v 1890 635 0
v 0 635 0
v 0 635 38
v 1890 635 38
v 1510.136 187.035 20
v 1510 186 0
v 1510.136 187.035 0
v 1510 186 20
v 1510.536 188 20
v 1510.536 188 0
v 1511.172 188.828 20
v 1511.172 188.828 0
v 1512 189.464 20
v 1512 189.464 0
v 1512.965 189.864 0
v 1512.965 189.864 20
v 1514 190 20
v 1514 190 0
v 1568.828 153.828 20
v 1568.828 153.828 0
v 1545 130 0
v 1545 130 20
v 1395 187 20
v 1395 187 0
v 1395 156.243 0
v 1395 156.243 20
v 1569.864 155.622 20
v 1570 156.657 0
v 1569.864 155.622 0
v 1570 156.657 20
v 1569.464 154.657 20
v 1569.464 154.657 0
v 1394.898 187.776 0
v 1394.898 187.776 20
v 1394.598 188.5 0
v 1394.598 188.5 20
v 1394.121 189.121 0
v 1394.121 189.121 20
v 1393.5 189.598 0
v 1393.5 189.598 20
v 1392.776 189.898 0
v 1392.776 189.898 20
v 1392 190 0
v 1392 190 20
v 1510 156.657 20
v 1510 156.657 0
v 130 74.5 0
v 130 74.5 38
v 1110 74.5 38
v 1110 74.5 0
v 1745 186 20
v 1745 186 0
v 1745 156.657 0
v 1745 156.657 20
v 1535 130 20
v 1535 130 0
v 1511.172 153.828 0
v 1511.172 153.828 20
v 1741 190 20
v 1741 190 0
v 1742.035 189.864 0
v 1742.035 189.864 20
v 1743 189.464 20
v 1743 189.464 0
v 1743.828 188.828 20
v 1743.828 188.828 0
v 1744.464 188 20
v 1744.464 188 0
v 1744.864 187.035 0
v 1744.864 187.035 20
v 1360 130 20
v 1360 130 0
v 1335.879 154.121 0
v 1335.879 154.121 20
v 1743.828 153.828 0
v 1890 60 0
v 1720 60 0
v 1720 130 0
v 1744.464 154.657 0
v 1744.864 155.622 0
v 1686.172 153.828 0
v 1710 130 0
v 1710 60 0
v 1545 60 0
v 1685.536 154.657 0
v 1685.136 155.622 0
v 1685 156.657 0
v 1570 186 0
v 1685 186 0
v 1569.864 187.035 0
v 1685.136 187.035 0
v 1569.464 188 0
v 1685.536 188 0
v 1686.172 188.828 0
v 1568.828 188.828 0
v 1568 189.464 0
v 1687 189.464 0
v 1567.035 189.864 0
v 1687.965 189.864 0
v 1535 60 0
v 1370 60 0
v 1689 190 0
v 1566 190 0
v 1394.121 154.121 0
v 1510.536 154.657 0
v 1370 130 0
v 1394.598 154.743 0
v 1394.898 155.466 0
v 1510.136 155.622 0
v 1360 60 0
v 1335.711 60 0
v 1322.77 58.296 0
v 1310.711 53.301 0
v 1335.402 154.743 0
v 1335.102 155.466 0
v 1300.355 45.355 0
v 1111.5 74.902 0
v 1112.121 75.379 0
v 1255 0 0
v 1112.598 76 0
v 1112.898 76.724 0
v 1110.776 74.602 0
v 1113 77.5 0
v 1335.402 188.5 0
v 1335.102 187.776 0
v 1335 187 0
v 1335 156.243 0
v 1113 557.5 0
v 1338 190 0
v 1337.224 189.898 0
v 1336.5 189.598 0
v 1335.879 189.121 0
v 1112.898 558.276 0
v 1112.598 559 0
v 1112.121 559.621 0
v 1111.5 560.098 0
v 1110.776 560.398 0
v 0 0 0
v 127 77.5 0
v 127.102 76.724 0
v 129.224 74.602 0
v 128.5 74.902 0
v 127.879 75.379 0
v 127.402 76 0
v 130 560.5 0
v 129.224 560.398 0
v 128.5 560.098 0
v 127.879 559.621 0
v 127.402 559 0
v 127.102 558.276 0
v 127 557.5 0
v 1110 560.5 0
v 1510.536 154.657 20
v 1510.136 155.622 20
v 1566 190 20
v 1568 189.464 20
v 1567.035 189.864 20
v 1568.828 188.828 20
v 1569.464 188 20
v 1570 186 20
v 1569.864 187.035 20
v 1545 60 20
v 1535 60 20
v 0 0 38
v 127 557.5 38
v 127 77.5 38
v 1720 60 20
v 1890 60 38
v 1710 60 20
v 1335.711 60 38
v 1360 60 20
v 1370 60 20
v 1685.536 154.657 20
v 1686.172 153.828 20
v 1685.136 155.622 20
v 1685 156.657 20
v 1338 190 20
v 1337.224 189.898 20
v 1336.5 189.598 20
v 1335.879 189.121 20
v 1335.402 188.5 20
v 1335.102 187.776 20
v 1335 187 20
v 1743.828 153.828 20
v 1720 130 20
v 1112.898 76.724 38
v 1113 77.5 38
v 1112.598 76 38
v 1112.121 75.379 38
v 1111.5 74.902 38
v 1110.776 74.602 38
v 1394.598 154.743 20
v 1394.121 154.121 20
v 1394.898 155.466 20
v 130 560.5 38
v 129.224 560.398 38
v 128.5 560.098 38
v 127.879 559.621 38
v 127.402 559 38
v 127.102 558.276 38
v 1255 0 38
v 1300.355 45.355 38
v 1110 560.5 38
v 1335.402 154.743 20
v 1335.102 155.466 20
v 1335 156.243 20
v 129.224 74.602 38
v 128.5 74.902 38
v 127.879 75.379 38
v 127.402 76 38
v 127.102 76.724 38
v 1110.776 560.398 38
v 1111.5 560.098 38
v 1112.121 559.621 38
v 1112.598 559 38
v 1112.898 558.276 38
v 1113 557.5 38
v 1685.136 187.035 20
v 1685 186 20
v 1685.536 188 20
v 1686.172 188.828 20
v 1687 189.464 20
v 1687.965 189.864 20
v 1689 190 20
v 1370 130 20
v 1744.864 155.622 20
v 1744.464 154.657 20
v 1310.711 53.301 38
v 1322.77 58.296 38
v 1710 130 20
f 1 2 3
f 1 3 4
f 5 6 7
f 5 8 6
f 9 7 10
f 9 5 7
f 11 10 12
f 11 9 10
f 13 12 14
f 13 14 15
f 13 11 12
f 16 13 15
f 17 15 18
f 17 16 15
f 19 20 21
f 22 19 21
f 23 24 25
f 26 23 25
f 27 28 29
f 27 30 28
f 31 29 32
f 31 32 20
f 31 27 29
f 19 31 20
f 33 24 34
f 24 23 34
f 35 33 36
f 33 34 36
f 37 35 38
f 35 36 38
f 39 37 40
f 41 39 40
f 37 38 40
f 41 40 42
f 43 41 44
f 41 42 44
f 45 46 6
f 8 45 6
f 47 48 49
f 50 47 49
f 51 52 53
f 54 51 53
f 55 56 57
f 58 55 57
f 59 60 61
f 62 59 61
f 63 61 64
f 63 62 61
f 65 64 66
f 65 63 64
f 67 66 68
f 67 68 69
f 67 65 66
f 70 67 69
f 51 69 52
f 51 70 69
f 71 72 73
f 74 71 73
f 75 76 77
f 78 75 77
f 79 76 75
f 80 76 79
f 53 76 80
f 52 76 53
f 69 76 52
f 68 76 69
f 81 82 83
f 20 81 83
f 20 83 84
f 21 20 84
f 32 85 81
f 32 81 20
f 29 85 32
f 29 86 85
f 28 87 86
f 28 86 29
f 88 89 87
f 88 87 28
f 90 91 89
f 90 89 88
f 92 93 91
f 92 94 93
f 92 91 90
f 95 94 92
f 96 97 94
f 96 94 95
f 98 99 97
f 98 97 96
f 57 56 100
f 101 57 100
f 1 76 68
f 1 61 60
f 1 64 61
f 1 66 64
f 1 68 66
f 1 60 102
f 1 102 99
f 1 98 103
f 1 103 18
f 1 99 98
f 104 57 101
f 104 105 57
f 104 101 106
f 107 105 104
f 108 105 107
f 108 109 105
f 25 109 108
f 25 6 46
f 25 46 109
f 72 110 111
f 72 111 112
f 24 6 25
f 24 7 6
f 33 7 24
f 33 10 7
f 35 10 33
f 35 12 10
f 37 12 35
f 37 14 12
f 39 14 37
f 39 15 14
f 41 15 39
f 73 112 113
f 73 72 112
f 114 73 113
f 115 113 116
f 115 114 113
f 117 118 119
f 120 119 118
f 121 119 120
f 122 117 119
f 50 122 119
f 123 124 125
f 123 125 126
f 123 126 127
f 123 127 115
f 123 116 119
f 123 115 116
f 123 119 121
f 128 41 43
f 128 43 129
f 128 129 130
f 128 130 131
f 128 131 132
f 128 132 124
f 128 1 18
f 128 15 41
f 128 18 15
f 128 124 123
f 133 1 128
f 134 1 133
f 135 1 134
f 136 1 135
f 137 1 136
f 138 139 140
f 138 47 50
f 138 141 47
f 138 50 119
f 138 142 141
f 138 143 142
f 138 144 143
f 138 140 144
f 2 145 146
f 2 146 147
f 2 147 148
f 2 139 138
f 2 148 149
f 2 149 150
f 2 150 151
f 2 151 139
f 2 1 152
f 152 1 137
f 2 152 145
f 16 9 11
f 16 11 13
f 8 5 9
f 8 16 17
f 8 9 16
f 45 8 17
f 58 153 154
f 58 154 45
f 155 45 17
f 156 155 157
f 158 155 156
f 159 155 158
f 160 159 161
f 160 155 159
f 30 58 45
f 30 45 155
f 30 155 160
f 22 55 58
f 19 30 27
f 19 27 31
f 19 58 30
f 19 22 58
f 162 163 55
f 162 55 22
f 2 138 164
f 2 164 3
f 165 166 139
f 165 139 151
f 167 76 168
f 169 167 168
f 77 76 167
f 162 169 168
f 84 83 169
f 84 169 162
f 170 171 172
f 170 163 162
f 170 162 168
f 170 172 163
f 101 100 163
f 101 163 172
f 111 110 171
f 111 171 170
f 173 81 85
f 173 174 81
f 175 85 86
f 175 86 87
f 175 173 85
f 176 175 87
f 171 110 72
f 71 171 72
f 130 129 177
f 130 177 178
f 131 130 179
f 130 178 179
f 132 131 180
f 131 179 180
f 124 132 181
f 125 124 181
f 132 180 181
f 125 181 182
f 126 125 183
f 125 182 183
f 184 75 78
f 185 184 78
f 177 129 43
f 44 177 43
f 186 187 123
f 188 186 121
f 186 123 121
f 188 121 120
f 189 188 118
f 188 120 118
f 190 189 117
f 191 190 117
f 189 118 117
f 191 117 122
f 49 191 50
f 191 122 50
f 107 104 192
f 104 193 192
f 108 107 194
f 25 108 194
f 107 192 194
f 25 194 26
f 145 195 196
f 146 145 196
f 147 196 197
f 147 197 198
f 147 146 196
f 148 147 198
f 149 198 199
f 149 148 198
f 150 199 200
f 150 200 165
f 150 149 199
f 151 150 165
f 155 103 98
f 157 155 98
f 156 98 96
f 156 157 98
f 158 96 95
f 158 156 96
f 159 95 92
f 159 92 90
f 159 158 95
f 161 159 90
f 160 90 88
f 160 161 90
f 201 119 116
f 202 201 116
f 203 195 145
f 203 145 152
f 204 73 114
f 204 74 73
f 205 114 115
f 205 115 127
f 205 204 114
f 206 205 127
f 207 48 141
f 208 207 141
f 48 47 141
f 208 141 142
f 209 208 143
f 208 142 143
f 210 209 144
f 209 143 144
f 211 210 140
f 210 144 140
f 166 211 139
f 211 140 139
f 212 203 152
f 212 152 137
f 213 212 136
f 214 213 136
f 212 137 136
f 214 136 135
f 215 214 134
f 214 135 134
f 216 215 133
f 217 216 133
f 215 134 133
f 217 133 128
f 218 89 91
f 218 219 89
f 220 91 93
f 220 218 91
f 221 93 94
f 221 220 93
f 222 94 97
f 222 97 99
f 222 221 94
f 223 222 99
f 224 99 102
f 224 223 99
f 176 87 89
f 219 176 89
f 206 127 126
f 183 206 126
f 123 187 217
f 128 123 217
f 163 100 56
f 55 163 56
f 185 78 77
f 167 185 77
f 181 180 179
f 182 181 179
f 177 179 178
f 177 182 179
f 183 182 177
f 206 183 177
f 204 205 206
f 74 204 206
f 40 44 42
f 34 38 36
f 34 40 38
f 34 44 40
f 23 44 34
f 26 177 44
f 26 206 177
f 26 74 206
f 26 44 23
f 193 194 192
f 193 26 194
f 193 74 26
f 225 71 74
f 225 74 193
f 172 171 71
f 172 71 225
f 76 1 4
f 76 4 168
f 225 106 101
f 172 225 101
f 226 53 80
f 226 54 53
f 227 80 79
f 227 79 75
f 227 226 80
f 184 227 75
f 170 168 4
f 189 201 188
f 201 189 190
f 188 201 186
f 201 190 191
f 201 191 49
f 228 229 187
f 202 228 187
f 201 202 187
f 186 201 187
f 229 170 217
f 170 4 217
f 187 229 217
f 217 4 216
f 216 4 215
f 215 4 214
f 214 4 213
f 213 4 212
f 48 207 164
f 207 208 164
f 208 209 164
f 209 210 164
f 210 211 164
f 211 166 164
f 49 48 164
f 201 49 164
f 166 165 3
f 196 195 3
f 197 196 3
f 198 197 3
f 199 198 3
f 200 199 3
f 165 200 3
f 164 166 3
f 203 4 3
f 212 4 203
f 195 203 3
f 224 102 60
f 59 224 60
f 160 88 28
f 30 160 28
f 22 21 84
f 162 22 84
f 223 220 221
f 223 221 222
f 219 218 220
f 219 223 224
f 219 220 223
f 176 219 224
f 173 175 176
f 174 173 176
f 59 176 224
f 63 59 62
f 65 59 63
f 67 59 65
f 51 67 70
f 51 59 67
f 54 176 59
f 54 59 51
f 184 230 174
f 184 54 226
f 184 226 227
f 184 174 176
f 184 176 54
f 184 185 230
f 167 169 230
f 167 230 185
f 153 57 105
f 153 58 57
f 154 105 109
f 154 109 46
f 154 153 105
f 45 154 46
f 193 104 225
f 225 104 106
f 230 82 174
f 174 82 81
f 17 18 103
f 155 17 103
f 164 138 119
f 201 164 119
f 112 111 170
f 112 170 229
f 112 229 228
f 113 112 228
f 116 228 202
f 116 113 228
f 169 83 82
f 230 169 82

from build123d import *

# Parameters (mm, degrees)
PAD_DEPTH       = 38
POCKET_DEPTH    = 20
FILLET_R        = 4
FILLET001_R     = 4
FILLET002_R     = 3
SKETCH002_W     = 986
SKETCH002_H     = 486
POCKET001_DEPTH = 38.001
FILLET003_R     = 3


with BuildPart() as part:
    # Sketch → Pad (new body)
    with BuildSketch(Plane.XY):
        with BuildLine():
            Line((0, 0), (0, 635))
            Line((0, 635), (1890, 635))
            Line((1890, 635), (1890, 60))
            Line((1890, 60), (1335.710678, 60))
            ThreePointArc((1335.710678, 60), (1316.576507, 56.193977), (1300.355339, 45.355339))
            Line((1255, 0), (1300.355339, 45.355339))
            Line((0, 0), (1255, 0))
        make_face()
    extrude(amount=PAD_DEPTH)

    # Sketch001 (on Face8 of Pad) → Pocket (cut)
    with BuildSketch(Plane(origin=(0, 0, 0), x_dir=(1, 0, 0), z_dir=(0, 0, -1))):
        Polygon((1535, -60), (1535, -130), (1510, -154.999975), (1510, -190), (1570, -190), (1570, -154.999975), (1545, -130), (1545, -60), align=None)
        Polygon((1710, -60), (1710, -130), (1685, -154.999975), (1685, -190), (1745, -190), (1745, -154.999975), (1720, -130), (1720, -60), align=None)
        Polygon((1360, -60), (1360, -130), (1335, -155), (1335, -190), (1395, -190), (1395, -155), (1370, -130), (1370, -60), align=None)
    extrude(amount=-POCKET_DEPTH, mode=Mode.SUBTRACT)

    # Fillet
    fillet_edges = [part.edges().sort_by_distance(p)[0] for p in [
        (1510, 154.999975, 10),
        (1510, 190, 10),
        (1570, 190, 10),
        (1570, 154.999975, 10),
    ]]
    fillet(fillet_edges, radius=FILLET_R)

    # Fillet001
    fillet001_edges = [part.edges().sort_by_distance(p)[0] for p in [
        (1685, 154.999975, 10),
        (1685, 190, 10),
        (1745, 154.999975, 10),
        (1745, 190, 10),
    ]]
    fillet(fillet001_edges, radius=FILLET001_R)

    # Fillet002
    fillet002_edges = [part.edges().sort_by_distance(p)[0] for p in [
        (1335, 155, 10),
        (1335, 190, 10),
        (1395, 155, 10),
        (1395, 190, 10),
    ]]
    fillet(fillet002_edges, radius=FILLET002_R)

    # Sketch002 (on Face41 of Fillet001) → Pocket001 (cut, through all)
    with BuildSketch(Plane.XY.offset(38)):
        with Locations((620, 317.5)):
            Rectangle(SKETCH002_W, SKETCH002_H)
    extrude(amount=-POCKET001_DEPTH, mode=Mode.SUBTRACT)

    # Fillet003
    fillet003_edges = [part.edges().sort_by_distance(p)[0] for p in [
        (1113, 74.5, 19),
        (127, 560.5, 19),
        (127, 74.5, 19),
        (1113, 560.5, 19),
    ]]
    fillet(fillet003_edges, radius=FILLET003_R)


solid = part.part
